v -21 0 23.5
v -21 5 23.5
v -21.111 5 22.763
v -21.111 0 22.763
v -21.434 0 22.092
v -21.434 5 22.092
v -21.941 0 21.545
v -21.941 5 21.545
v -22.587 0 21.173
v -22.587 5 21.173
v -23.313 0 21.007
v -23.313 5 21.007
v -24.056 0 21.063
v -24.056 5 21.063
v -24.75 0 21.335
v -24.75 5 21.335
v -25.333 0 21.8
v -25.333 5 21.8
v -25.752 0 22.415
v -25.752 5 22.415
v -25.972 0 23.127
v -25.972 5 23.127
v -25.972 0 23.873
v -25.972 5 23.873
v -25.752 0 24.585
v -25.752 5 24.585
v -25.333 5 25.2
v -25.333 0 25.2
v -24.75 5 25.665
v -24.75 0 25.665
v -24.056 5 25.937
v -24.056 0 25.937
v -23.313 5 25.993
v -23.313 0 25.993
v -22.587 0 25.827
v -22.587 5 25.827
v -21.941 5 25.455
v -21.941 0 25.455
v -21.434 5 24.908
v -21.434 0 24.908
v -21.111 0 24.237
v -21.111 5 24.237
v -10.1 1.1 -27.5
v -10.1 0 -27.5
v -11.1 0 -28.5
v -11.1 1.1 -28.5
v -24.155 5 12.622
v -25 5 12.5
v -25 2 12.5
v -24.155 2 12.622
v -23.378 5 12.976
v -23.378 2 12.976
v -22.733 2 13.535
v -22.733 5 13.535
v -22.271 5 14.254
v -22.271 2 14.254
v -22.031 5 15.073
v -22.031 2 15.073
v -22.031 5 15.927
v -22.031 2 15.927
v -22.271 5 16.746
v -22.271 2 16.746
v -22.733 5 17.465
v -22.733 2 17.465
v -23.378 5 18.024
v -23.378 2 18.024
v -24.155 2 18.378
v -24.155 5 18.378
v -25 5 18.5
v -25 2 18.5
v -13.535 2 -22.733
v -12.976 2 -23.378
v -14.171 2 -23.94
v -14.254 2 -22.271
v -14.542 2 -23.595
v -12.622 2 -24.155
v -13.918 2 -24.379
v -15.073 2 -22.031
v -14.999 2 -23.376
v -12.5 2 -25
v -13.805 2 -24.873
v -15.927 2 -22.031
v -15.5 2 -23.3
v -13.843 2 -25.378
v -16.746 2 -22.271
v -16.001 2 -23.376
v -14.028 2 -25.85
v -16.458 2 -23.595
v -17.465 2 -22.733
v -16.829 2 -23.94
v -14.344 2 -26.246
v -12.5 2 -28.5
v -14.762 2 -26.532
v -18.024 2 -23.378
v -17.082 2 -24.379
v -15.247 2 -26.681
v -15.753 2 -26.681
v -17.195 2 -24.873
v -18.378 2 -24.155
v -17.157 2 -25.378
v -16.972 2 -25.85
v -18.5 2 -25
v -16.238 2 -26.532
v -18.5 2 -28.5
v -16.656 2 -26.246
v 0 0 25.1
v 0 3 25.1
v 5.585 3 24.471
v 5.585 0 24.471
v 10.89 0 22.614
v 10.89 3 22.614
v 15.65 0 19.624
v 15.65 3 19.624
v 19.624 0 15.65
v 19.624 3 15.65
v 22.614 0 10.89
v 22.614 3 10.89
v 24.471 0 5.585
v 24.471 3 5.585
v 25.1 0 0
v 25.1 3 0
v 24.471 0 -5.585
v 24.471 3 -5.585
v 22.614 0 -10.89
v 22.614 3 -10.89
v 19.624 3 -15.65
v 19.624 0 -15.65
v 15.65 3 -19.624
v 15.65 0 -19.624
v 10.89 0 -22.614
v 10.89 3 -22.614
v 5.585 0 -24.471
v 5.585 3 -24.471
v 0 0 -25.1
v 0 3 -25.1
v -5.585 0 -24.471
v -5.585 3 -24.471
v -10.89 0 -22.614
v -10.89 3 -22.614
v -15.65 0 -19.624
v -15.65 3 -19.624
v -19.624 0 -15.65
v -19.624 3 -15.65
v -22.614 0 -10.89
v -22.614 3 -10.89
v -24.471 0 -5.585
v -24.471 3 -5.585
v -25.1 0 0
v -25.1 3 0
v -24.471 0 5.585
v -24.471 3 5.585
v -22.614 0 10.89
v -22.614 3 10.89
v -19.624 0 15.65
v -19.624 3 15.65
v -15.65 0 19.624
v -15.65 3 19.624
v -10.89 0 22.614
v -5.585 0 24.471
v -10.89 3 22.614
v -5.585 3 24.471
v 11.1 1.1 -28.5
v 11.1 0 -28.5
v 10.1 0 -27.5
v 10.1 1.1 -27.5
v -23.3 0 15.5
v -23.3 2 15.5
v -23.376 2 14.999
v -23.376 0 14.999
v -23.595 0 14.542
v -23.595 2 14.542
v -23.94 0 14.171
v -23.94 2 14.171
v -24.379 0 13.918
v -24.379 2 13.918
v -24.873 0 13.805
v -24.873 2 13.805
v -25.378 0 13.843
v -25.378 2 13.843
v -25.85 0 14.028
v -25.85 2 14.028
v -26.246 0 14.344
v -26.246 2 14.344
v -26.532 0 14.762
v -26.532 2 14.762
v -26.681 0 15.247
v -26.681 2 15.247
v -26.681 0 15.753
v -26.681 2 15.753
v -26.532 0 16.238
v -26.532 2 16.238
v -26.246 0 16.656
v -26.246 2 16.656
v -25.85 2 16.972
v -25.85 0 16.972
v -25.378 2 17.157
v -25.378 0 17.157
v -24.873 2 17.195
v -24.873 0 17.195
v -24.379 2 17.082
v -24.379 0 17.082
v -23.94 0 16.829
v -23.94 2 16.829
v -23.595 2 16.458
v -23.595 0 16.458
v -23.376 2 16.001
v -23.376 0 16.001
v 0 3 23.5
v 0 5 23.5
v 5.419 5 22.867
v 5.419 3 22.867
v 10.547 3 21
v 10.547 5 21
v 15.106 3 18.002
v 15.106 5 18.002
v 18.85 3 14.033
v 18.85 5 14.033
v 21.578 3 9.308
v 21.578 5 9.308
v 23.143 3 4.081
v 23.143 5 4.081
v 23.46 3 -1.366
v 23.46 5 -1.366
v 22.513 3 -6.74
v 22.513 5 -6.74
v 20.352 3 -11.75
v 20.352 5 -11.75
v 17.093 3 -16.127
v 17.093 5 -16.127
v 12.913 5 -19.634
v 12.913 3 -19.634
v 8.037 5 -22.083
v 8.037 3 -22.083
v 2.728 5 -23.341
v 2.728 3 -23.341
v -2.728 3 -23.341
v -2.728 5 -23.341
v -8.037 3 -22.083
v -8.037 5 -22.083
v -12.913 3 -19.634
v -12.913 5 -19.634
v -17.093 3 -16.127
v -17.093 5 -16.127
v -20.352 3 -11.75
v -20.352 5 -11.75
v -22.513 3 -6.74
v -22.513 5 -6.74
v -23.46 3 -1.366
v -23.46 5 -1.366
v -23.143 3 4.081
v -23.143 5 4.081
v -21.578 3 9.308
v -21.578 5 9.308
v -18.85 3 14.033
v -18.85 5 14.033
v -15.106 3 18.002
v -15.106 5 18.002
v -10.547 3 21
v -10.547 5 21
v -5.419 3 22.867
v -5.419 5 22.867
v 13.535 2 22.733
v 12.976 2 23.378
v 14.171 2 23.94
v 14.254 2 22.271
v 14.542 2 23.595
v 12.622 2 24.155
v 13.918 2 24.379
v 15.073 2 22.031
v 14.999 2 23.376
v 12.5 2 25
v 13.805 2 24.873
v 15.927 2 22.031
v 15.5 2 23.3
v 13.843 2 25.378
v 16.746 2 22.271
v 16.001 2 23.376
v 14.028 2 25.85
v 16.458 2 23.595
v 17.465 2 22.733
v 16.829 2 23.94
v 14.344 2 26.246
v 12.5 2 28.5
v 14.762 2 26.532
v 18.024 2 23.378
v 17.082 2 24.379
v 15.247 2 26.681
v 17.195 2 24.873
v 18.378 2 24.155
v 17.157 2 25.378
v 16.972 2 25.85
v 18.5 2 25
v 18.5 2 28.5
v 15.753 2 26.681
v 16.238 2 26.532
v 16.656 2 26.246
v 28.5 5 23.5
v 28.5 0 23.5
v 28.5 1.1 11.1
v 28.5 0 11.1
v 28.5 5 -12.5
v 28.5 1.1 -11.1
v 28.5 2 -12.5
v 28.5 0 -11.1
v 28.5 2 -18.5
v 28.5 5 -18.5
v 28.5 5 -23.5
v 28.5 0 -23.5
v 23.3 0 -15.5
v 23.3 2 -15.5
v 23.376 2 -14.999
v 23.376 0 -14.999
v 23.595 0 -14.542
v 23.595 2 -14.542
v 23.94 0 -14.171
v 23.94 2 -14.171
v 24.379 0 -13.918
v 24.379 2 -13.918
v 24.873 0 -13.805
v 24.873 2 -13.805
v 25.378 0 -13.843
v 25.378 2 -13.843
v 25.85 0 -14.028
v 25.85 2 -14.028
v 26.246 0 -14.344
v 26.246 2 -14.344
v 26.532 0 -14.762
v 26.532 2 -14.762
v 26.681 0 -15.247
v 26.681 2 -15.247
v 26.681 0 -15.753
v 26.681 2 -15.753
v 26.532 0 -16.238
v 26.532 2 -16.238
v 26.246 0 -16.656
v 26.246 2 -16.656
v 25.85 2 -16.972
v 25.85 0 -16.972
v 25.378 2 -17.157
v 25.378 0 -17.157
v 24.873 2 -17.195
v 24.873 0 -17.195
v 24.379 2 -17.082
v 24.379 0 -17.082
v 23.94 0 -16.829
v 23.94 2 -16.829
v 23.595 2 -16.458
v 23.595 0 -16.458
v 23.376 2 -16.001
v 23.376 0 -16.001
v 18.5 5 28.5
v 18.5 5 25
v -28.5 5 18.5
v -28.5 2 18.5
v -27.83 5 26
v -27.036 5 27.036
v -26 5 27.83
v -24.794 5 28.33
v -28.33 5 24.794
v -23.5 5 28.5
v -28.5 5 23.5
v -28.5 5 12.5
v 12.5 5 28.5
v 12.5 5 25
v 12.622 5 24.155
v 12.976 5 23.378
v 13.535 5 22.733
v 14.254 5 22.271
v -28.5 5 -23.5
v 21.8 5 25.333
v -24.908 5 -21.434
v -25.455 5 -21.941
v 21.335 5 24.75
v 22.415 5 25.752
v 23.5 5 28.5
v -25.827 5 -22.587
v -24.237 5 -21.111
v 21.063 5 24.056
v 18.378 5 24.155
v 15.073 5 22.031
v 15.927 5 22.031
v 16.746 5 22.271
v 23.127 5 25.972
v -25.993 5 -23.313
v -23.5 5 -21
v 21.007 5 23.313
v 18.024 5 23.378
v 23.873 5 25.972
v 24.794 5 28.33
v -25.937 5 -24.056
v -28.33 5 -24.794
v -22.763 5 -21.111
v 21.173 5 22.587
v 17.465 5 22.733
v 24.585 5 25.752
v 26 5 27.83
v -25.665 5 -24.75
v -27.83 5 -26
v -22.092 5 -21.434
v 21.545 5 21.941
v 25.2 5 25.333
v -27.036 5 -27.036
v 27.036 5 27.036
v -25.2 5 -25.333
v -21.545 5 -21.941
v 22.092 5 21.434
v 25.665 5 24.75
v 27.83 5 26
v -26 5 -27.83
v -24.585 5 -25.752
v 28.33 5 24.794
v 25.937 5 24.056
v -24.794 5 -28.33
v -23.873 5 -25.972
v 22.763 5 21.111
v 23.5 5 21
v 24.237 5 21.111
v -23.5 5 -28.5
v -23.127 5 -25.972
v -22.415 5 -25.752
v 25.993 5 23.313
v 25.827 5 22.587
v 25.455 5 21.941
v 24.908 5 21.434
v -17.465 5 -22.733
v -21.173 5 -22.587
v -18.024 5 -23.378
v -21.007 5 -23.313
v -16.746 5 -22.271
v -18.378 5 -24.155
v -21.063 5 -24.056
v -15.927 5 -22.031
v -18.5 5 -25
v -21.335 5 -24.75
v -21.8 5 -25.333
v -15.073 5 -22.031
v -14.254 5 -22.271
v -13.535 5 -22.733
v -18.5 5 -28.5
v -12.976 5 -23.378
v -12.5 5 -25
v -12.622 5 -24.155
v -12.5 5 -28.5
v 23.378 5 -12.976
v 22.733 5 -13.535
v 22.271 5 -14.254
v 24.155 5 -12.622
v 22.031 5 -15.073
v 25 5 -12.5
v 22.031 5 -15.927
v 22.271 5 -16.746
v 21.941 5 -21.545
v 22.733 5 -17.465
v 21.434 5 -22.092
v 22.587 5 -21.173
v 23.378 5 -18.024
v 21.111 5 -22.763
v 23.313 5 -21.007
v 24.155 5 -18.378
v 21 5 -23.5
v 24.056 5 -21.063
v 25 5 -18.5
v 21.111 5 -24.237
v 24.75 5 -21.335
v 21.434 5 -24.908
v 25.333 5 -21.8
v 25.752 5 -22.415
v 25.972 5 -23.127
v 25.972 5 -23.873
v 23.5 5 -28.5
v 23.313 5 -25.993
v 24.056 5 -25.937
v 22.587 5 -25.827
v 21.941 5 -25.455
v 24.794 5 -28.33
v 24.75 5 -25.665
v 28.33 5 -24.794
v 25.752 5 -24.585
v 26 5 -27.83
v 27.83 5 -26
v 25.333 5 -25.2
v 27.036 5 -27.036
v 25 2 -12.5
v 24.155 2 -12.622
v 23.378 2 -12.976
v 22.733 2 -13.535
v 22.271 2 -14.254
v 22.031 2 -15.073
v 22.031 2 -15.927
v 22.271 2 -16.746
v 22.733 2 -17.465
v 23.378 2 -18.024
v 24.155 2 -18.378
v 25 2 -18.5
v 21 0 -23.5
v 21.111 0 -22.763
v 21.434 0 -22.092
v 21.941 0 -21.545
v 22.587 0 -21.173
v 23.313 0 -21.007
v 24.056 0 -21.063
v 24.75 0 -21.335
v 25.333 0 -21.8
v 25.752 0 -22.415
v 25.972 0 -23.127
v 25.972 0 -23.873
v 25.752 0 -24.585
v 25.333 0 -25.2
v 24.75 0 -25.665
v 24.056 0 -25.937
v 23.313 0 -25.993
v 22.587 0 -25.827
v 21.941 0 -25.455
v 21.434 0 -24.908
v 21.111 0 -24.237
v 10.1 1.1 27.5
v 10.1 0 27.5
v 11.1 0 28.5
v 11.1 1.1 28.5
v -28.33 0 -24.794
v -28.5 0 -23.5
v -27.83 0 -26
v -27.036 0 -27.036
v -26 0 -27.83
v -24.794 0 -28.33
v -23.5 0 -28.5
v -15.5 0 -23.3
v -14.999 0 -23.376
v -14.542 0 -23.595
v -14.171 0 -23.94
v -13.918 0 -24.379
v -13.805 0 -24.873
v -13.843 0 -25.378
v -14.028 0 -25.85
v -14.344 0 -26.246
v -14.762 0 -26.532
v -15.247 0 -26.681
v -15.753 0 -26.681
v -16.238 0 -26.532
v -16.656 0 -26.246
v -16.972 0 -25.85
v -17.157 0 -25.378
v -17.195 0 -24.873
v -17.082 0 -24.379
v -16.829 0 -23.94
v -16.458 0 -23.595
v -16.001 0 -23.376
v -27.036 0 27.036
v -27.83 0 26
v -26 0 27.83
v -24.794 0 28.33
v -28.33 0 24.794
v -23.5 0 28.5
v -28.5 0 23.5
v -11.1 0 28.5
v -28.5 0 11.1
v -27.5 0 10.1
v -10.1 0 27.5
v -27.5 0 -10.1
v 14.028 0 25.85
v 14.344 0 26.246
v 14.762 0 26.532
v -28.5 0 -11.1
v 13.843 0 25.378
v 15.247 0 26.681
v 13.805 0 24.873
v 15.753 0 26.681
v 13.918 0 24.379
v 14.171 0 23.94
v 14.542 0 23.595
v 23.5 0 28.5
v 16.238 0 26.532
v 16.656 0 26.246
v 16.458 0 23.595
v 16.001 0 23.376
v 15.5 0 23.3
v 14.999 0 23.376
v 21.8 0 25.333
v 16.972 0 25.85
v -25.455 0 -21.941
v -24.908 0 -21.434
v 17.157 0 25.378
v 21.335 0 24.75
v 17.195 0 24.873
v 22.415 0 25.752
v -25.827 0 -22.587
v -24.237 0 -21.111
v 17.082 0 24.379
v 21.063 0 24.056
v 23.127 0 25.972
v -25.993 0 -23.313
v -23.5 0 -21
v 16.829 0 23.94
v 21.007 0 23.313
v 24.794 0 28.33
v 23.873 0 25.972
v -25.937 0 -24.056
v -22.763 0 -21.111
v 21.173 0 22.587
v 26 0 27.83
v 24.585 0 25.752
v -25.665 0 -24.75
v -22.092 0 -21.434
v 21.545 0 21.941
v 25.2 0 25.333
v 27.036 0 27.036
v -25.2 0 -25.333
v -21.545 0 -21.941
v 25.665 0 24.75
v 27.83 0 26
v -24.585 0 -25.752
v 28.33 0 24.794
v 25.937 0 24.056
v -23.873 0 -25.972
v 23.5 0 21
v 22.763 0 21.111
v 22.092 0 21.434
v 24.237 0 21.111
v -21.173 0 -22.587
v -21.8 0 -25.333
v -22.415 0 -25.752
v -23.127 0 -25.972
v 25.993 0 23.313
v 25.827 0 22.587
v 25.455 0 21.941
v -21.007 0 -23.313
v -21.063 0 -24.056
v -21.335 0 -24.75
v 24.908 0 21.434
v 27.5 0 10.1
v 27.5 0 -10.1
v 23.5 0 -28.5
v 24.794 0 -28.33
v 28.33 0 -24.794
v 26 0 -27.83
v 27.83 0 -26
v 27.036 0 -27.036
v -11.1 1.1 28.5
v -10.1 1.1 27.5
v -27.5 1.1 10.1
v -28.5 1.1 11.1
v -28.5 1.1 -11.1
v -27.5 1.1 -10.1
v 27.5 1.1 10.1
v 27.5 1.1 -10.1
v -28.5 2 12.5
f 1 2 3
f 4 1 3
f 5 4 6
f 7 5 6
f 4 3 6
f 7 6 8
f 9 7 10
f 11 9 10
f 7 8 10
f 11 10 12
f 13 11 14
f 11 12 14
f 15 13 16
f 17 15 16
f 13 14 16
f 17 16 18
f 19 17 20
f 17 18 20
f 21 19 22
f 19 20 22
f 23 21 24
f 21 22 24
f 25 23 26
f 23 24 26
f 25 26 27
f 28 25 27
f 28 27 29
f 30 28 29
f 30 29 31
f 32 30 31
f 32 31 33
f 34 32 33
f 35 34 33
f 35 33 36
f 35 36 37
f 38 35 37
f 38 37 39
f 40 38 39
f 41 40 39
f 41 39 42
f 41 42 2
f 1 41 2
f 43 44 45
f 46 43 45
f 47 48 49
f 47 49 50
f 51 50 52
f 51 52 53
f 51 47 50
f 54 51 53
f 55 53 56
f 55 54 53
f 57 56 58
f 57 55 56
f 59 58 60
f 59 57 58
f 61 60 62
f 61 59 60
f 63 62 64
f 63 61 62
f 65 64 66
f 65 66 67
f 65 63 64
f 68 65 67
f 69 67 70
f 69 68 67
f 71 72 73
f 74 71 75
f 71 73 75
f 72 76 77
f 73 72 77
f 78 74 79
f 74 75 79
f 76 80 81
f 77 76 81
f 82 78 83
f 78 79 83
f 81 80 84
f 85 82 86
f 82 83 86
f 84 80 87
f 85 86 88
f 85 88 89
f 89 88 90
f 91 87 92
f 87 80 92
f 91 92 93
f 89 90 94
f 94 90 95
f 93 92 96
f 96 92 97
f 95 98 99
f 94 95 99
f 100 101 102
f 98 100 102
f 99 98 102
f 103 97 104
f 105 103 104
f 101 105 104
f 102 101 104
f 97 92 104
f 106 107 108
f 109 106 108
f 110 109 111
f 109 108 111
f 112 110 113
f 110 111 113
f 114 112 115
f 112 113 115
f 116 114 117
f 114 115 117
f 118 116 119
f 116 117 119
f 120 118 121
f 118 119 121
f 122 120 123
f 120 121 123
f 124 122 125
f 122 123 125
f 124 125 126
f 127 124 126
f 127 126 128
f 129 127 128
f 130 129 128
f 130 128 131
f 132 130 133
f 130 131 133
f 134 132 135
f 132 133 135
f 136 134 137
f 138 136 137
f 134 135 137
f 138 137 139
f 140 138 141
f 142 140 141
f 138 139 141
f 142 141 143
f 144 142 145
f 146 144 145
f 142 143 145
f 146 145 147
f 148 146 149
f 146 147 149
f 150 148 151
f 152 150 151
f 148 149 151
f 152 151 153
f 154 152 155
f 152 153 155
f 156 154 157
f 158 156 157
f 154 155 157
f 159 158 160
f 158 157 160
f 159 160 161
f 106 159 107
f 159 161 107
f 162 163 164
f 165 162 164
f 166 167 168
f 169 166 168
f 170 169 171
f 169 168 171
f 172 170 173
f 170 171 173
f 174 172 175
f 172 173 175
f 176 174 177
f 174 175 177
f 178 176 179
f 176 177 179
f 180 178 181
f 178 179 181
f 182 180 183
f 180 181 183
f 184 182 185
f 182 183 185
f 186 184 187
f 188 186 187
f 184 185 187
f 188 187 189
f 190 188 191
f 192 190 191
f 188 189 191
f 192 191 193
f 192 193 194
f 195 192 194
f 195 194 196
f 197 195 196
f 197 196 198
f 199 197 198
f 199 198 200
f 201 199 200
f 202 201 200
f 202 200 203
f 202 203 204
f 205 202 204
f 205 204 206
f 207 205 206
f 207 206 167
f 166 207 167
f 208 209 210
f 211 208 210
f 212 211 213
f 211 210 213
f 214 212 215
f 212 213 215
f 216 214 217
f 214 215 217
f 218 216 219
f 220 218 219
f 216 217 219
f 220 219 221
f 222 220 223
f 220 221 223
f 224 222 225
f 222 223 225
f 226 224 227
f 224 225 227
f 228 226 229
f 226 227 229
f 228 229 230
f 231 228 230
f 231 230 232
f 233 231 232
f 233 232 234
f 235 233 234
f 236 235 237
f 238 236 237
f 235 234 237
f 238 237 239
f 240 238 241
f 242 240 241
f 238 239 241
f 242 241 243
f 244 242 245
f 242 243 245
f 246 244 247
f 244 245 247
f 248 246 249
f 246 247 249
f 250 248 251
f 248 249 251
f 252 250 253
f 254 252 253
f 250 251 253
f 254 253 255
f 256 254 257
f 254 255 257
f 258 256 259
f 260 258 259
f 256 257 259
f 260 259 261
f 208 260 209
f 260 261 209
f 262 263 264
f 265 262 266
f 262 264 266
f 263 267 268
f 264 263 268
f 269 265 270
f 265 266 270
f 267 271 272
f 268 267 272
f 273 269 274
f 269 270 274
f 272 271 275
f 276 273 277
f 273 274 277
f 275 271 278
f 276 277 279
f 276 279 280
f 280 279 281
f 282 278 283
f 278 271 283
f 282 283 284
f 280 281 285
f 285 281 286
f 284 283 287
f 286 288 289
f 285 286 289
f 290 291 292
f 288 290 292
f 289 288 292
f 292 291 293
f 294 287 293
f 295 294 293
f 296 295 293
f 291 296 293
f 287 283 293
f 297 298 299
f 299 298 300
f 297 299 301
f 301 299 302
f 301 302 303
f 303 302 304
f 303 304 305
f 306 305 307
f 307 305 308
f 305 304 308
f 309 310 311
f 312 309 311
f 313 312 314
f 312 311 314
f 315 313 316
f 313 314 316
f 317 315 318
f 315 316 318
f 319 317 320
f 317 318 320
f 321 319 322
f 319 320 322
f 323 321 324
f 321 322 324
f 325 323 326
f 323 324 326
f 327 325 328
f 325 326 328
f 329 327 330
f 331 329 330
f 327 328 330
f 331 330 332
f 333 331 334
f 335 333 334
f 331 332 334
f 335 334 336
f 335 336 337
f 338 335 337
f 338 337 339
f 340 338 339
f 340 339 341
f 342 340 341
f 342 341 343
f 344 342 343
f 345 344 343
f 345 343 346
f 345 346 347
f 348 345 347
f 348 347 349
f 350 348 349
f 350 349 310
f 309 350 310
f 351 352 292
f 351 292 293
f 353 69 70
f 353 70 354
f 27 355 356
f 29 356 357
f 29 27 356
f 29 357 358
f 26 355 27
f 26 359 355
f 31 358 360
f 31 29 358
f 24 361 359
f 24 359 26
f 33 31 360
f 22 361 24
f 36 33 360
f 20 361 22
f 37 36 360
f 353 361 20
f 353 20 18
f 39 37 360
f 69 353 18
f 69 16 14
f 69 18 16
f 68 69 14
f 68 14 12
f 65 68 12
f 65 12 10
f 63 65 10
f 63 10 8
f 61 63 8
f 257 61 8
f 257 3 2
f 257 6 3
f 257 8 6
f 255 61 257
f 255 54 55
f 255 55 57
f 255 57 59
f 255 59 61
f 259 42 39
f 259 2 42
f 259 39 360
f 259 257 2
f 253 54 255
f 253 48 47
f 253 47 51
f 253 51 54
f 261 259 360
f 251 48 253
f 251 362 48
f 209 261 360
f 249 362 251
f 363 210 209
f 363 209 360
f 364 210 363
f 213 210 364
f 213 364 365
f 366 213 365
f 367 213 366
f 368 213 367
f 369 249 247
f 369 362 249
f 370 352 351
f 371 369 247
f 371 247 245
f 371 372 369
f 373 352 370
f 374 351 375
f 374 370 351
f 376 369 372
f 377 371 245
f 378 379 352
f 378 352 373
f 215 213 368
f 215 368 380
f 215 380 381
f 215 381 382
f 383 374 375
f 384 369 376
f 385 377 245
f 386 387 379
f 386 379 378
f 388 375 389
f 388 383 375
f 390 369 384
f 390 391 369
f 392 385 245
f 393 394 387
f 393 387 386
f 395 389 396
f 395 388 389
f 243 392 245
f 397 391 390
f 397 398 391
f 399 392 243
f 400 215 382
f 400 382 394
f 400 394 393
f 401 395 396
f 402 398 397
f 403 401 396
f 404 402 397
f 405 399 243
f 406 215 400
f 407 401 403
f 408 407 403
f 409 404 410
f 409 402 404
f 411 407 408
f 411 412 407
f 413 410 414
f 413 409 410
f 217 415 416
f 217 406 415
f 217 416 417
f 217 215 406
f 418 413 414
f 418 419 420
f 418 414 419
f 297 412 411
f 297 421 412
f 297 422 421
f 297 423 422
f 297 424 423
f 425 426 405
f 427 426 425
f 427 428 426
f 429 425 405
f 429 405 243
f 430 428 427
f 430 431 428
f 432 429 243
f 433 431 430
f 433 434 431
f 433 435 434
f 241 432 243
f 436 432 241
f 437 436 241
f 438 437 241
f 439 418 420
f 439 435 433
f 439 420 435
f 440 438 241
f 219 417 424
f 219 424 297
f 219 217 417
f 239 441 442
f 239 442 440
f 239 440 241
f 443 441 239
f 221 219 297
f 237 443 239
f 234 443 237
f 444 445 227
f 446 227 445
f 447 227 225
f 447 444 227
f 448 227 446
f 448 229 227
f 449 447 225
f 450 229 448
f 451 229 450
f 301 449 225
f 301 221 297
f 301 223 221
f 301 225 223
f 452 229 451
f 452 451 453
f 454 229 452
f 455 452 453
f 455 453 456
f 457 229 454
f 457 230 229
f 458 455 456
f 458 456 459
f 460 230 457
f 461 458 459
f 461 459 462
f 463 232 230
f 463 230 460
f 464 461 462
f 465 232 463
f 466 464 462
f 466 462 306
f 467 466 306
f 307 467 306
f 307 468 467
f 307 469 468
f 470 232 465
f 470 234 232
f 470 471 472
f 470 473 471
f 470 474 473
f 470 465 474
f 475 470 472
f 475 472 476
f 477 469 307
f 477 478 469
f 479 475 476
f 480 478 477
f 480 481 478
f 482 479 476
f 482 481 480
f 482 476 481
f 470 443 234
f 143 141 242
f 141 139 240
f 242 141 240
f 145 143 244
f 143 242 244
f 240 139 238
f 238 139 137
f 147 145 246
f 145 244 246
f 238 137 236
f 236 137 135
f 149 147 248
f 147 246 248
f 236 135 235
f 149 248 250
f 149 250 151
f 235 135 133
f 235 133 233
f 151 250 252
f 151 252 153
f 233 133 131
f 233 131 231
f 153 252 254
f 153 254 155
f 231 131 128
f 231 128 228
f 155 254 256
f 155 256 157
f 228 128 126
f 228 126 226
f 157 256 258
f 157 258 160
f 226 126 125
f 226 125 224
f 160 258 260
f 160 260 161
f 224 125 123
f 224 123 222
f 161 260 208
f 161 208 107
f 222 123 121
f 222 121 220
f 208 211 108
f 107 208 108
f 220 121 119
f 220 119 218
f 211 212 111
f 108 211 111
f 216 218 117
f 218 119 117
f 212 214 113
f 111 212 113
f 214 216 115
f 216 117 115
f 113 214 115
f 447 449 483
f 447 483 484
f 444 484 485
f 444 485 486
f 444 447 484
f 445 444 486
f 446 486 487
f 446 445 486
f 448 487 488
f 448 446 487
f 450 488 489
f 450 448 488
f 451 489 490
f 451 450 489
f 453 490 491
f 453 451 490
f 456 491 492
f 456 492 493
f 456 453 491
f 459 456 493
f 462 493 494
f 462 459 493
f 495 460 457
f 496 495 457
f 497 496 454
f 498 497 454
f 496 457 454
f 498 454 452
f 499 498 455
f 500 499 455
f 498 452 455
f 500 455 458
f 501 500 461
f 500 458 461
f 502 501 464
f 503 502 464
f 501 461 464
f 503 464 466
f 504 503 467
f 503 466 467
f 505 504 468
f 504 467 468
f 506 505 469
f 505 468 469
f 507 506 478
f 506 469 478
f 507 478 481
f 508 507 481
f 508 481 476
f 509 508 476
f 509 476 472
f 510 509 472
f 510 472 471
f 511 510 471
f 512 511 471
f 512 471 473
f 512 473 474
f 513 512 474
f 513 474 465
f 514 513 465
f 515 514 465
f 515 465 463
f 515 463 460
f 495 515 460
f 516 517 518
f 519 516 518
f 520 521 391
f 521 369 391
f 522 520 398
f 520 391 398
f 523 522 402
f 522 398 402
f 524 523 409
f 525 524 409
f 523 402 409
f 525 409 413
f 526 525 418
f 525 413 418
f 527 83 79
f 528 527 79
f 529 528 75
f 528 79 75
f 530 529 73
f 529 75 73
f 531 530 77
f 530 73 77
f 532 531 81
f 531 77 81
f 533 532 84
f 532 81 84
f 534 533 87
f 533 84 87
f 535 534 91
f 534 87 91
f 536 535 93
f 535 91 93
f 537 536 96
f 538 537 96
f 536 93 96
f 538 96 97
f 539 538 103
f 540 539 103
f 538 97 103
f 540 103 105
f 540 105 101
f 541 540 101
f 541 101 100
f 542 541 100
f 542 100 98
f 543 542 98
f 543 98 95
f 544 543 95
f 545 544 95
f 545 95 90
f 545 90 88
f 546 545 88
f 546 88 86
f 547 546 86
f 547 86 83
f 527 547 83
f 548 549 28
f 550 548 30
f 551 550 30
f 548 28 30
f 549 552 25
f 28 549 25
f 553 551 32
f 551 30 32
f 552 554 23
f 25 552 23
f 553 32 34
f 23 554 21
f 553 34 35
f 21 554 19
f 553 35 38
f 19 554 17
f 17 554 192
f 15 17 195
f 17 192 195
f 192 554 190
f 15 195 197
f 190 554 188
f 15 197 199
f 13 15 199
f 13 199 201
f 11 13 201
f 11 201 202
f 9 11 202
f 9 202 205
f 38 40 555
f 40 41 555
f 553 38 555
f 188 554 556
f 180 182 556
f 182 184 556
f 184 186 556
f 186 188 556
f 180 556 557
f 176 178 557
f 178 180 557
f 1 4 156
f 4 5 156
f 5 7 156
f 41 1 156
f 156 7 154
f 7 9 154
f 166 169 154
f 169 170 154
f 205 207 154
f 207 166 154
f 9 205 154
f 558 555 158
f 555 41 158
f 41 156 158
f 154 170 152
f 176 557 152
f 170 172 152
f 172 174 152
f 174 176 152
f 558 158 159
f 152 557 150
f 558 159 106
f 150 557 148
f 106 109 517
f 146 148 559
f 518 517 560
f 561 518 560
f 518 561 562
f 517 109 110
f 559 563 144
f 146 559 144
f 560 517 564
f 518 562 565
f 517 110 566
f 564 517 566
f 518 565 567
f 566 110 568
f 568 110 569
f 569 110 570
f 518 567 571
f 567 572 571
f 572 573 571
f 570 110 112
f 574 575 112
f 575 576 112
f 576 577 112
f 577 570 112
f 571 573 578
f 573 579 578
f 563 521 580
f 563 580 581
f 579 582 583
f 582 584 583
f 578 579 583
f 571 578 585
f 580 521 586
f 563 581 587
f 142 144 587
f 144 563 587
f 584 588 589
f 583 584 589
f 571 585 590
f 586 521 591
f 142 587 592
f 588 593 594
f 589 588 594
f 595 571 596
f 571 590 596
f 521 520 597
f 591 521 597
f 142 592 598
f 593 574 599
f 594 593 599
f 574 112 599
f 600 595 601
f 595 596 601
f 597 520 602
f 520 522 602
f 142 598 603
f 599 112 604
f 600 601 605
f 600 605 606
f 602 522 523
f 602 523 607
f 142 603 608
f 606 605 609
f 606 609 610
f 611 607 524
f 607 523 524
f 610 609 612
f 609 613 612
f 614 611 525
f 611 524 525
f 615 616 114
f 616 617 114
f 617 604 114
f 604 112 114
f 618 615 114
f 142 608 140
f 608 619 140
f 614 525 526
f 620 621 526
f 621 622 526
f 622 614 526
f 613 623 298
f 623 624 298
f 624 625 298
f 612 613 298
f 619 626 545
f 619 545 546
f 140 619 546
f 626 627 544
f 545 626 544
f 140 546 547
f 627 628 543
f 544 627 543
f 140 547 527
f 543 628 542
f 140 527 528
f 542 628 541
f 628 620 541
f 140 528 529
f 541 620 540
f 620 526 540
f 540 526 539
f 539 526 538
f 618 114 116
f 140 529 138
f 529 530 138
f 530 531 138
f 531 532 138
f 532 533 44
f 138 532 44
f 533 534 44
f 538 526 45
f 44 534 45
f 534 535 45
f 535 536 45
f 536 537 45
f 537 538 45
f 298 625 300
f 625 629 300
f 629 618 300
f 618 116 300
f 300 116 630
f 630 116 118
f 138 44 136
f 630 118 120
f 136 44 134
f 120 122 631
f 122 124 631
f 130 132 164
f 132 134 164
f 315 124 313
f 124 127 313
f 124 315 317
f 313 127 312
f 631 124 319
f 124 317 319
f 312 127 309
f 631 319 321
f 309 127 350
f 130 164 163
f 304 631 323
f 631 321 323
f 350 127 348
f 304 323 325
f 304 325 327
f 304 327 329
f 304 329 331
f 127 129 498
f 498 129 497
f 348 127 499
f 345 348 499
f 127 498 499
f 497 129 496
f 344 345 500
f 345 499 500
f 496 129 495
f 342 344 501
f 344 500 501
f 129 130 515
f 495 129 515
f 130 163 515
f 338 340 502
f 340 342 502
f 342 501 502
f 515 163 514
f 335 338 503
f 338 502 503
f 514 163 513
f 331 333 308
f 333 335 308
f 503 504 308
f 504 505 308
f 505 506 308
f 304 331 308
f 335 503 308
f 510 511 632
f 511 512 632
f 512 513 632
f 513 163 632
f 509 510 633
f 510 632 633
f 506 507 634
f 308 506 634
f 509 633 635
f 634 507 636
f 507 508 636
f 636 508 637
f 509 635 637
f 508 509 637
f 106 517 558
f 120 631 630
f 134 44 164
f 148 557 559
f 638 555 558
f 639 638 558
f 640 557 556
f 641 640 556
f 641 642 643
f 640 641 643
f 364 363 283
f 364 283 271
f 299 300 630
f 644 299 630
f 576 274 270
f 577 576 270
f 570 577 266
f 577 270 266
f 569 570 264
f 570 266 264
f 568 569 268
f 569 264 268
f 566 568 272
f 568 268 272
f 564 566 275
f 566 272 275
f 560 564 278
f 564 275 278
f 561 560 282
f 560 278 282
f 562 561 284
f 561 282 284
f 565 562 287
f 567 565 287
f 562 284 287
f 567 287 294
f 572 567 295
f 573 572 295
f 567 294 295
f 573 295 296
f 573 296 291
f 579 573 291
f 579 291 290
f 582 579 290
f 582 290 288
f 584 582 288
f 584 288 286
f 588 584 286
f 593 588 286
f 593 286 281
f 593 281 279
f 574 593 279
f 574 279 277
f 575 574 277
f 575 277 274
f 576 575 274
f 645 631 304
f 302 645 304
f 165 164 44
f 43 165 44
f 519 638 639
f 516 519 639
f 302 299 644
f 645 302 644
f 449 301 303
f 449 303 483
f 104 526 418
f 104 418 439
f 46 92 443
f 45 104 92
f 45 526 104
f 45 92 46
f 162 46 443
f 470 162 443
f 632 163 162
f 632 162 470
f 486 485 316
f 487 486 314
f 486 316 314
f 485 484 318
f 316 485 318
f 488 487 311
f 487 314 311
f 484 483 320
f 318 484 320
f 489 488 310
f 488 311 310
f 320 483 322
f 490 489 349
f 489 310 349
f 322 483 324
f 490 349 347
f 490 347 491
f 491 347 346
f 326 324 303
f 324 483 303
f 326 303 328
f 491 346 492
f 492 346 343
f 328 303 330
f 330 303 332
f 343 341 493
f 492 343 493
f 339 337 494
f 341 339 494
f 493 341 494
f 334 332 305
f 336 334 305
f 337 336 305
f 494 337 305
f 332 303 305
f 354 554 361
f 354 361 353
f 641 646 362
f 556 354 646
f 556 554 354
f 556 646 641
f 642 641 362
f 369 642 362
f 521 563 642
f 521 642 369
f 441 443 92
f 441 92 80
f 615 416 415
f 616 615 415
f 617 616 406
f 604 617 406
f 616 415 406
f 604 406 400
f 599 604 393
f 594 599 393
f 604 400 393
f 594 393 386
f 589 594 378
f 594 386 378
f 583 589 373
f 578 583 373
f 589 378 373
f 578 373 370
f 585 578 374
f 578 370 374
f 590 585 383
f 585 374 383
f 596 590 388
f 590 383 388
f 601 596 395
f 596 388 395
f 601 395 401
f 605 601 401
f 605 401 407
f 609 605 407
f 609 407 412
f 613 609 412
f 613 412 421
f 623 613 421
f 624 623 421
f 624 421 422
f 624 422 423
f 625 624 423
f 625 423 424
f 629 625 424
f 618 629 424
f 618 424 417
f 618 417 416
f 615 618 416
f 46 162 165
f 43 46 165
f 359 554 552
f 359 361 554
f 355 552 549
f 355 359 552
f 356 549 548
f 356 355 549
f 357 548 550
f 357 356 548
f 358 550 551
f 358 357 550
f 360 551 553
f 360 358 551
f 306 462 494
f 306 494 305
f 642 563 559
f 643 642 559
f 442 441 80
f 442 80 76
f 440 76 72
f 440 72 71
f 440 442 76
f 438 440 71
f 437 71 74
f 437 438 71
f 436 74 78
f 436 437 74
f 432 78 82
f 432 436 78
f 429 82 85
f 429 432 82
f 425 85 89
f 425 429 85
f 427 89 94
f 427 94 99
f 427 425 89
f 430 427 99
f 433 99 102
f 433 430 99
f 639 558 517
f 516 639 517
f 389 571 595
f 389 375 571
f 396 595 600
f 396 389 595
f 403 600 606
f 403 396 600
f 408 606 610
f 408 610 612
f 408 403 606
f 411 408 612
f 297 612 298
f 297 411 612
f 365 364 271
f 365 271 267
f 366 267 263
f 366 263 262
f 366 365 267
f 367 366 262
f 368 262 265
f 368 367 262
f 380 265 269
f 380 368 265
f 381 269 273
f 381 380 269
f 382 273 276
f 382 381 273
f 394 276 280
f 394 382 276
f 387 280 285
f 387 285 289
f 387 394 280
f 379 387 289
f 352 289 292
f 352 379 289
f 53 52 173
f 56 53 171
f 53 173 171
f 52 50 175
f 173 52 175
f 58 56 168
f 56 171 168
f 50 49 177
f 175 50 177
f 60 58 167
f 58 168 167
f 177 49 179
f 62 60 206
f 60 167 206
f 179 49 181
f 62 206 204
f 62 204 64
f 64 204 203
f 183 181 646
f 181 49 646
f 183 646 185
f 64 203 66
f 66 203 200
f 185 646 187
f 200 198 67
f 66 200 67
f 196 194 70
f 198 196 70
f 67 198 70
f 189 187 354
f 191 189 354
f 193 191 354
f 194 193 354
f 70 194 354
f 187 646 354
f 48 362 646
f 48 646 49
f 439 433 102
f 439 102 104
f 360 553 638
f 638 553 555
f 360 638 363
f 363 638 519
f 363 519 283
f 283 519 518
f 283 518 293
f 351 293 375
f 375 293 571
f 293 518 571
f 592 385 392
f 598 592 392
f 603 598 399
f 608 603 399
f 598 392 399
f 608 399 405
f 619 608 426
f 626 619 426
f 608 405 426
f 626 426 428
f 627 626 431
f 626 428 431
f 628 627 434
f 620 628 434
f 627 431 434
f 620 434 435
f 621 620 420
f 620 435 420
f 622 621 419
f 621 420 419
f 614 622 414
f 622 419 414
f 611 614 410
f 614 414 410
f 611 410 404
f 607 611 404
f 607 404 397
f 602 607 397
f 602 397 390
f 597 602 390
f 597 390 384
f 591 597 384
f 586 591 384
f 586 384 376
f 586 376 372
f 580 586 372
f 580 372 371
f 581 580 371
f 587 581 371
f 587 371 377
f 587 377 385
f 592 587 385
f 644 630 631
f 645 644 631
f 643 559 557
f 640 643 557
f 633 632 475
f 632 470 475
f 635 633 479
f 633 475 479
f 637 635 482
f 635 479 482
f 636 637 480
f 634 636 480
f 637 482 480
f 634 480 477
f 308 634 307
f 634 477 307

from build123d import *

# Parameters (mm, degrees)
SKETCH_1_W               = 57
SKETCH_1_H               = 57
EXTRUDE_1_DEPTH          = 5
SKETCH_2_R               = 23.5
CUT_EXTRUDE_1_DEPTH      = 2
SKETCH_3_R               = 25.1
CUT_EXTRUDE_2_DEPTH      = 3
SKETCH_4_R               = 2.5
SKETCH_4_R_2             = 1.7
CUT_EXTRUDE_3_DEPTH      = 41.614036982
CUT_EXTRUDE_4_DEPTH      = 3
CUT_EXTRUDE_5_DEPTH      = 1.1
PATTERN_CIRCULAR_1_COUNT = 4
FILLET_1_R               = 5


with BuildPart() as part:
    # 草图1 → 凸台-拉伸1 (new body)
    with BuildSketch(Plane(origin=(0, 0, 0), x_dir=(1, 0, 0), z_dir=(0, 1, 0))):
        Rectangle(SKETCH_1_W, SKETCH_1_H)
    extrude(amount=EXTRUDE_1_DEPTH)

    # 草图2 → 切除-拉伸1 (cut)
    with BuildSketch(Plane(origin=(0, 5, 0), x_dir=(1, 0, 0), z_dir=(0, 1, 0))):
        with Locations(Location((0, 0, 0), (0, 0, 270))):
            Circle(SKETCH_2_R)
    extrude(amount=-CUT_EXTRUDE_1_DEPTH, mode=Mode.SUBTRACT)

    # 草图3 → 切除-拉伸2 (cut)
    with BuildSketch(Plane(origin=(0, 3, 0), x_dir=(1, 0, 0), z_dir=(0, 1, 0))):
        with Locations(Location((0, 0, 0), (0, 0, 270))):
            Circle(SKETCH_3_R)
    extrude(amount=-CUT_EXTRUDE_2_DEPTH, mode=Mode.SUBTRACT)

    # 草图4 → 切除-拉伸3 (cut, through all)
    with BuildSketch(Plane(origin=(0, 5, 0), x_dir=(1, 0, 0), z_dir=(0, 1, 0))):
        with Locations(Location((-23.5, 23.5, 0), (0, 0, 270))):
            Circle(SKETCH_4_R)
        with Locations(Location((-15.5, 25, 0), (0, 0, 270))):
            Circle(SKETCH_4_R_2)
    cut_extrude_3 = extrude(amount=-CUT_EXTRUDE_3_DEPTH, mode=Mode.SUBTRACT)

    # 草图5 → 切除-拉伸4 (cut)
    with BuildSketch(Plane(origin=(0, 5, 0), x_dir=(1, 0, 0), z_dir=(0, 1, 0))):
        with BuildLine():
            Line((-18.5, 25), (-18.5, 30.780907879))
            ThreePointArc((-18.5, 30.780907879), (-15.5, 33.780907879), (-12.5, 30.780907879))
            Line((-12.5, 30.780907879), (-12.5, 25))
            ThreePointArc((-12.5, 25), (-15.5, 22), (-18.5, 25))
        make_face()
    cut_extrude_4 = extrude(amount=-CUT_EXTRUDE_4_DEPTH, mode=Mode.SUBTRACT)

    # 草图6 → 切除-拉伸5 (cut)
    with BuildSketch(Plane.XZ):
        Polygon((-28.5, 11.1), (-28.5, -11.1), (-27.5, -10.1), (-27.5, 10.1), align=None)
    cut_extrude_5 = extrude(amount=-CUT_EXTRUDE_5_DEPTH, mode=Mode.SUBTRACT)

    # 阵列(圆周)1: 切除-拉伸3, 切除-拉伸4, 切除-拉伸5 ×4 about axis
    pattern_circular_1_axis = Axis((0, 0, 0), (0, 1, 0))
    add([cut_extrude_3.rotate(pattern_circular_1_axis, i * 360 / PATTERN_CIRCULAR_1_COUNT) for i in range(1, PATTERN_CIRCULAR_1_COUNT)], mode=Mode.SUBTRACT)
    add([cut_extrude_4.rotate(pattern_circular_1_axis, i * 360 / PATTERN_CIRCULAR_1_COUNT) for i in range(1, PATTERN_CIRCULAR_1_COUNT)], mode=Mode.SUBTRACT)
    add([cut_extrude_5.rotate(pattern_circular_1_axis, i * 360 / PATTERN_CIRCULAR_1_COUNT) for i in range(1, PATTERN_CIRCULAR_1_COUNT)], mode=Mode.SUBTRACT)

    # 圆角1
    fillet_1_edges = [part.edges().sort_by_distance(p)[0] for p in [
        (28.5, 2.5, 28.5),
        (-28.5, 2.5, 28.5),
        (-28.5, 2.5, -28.5),
        (28.5, 2.5, -28.5),
    ]]
    fillet(fillet_1_edges, radius=FILLET_1_R)


solid = part.part
